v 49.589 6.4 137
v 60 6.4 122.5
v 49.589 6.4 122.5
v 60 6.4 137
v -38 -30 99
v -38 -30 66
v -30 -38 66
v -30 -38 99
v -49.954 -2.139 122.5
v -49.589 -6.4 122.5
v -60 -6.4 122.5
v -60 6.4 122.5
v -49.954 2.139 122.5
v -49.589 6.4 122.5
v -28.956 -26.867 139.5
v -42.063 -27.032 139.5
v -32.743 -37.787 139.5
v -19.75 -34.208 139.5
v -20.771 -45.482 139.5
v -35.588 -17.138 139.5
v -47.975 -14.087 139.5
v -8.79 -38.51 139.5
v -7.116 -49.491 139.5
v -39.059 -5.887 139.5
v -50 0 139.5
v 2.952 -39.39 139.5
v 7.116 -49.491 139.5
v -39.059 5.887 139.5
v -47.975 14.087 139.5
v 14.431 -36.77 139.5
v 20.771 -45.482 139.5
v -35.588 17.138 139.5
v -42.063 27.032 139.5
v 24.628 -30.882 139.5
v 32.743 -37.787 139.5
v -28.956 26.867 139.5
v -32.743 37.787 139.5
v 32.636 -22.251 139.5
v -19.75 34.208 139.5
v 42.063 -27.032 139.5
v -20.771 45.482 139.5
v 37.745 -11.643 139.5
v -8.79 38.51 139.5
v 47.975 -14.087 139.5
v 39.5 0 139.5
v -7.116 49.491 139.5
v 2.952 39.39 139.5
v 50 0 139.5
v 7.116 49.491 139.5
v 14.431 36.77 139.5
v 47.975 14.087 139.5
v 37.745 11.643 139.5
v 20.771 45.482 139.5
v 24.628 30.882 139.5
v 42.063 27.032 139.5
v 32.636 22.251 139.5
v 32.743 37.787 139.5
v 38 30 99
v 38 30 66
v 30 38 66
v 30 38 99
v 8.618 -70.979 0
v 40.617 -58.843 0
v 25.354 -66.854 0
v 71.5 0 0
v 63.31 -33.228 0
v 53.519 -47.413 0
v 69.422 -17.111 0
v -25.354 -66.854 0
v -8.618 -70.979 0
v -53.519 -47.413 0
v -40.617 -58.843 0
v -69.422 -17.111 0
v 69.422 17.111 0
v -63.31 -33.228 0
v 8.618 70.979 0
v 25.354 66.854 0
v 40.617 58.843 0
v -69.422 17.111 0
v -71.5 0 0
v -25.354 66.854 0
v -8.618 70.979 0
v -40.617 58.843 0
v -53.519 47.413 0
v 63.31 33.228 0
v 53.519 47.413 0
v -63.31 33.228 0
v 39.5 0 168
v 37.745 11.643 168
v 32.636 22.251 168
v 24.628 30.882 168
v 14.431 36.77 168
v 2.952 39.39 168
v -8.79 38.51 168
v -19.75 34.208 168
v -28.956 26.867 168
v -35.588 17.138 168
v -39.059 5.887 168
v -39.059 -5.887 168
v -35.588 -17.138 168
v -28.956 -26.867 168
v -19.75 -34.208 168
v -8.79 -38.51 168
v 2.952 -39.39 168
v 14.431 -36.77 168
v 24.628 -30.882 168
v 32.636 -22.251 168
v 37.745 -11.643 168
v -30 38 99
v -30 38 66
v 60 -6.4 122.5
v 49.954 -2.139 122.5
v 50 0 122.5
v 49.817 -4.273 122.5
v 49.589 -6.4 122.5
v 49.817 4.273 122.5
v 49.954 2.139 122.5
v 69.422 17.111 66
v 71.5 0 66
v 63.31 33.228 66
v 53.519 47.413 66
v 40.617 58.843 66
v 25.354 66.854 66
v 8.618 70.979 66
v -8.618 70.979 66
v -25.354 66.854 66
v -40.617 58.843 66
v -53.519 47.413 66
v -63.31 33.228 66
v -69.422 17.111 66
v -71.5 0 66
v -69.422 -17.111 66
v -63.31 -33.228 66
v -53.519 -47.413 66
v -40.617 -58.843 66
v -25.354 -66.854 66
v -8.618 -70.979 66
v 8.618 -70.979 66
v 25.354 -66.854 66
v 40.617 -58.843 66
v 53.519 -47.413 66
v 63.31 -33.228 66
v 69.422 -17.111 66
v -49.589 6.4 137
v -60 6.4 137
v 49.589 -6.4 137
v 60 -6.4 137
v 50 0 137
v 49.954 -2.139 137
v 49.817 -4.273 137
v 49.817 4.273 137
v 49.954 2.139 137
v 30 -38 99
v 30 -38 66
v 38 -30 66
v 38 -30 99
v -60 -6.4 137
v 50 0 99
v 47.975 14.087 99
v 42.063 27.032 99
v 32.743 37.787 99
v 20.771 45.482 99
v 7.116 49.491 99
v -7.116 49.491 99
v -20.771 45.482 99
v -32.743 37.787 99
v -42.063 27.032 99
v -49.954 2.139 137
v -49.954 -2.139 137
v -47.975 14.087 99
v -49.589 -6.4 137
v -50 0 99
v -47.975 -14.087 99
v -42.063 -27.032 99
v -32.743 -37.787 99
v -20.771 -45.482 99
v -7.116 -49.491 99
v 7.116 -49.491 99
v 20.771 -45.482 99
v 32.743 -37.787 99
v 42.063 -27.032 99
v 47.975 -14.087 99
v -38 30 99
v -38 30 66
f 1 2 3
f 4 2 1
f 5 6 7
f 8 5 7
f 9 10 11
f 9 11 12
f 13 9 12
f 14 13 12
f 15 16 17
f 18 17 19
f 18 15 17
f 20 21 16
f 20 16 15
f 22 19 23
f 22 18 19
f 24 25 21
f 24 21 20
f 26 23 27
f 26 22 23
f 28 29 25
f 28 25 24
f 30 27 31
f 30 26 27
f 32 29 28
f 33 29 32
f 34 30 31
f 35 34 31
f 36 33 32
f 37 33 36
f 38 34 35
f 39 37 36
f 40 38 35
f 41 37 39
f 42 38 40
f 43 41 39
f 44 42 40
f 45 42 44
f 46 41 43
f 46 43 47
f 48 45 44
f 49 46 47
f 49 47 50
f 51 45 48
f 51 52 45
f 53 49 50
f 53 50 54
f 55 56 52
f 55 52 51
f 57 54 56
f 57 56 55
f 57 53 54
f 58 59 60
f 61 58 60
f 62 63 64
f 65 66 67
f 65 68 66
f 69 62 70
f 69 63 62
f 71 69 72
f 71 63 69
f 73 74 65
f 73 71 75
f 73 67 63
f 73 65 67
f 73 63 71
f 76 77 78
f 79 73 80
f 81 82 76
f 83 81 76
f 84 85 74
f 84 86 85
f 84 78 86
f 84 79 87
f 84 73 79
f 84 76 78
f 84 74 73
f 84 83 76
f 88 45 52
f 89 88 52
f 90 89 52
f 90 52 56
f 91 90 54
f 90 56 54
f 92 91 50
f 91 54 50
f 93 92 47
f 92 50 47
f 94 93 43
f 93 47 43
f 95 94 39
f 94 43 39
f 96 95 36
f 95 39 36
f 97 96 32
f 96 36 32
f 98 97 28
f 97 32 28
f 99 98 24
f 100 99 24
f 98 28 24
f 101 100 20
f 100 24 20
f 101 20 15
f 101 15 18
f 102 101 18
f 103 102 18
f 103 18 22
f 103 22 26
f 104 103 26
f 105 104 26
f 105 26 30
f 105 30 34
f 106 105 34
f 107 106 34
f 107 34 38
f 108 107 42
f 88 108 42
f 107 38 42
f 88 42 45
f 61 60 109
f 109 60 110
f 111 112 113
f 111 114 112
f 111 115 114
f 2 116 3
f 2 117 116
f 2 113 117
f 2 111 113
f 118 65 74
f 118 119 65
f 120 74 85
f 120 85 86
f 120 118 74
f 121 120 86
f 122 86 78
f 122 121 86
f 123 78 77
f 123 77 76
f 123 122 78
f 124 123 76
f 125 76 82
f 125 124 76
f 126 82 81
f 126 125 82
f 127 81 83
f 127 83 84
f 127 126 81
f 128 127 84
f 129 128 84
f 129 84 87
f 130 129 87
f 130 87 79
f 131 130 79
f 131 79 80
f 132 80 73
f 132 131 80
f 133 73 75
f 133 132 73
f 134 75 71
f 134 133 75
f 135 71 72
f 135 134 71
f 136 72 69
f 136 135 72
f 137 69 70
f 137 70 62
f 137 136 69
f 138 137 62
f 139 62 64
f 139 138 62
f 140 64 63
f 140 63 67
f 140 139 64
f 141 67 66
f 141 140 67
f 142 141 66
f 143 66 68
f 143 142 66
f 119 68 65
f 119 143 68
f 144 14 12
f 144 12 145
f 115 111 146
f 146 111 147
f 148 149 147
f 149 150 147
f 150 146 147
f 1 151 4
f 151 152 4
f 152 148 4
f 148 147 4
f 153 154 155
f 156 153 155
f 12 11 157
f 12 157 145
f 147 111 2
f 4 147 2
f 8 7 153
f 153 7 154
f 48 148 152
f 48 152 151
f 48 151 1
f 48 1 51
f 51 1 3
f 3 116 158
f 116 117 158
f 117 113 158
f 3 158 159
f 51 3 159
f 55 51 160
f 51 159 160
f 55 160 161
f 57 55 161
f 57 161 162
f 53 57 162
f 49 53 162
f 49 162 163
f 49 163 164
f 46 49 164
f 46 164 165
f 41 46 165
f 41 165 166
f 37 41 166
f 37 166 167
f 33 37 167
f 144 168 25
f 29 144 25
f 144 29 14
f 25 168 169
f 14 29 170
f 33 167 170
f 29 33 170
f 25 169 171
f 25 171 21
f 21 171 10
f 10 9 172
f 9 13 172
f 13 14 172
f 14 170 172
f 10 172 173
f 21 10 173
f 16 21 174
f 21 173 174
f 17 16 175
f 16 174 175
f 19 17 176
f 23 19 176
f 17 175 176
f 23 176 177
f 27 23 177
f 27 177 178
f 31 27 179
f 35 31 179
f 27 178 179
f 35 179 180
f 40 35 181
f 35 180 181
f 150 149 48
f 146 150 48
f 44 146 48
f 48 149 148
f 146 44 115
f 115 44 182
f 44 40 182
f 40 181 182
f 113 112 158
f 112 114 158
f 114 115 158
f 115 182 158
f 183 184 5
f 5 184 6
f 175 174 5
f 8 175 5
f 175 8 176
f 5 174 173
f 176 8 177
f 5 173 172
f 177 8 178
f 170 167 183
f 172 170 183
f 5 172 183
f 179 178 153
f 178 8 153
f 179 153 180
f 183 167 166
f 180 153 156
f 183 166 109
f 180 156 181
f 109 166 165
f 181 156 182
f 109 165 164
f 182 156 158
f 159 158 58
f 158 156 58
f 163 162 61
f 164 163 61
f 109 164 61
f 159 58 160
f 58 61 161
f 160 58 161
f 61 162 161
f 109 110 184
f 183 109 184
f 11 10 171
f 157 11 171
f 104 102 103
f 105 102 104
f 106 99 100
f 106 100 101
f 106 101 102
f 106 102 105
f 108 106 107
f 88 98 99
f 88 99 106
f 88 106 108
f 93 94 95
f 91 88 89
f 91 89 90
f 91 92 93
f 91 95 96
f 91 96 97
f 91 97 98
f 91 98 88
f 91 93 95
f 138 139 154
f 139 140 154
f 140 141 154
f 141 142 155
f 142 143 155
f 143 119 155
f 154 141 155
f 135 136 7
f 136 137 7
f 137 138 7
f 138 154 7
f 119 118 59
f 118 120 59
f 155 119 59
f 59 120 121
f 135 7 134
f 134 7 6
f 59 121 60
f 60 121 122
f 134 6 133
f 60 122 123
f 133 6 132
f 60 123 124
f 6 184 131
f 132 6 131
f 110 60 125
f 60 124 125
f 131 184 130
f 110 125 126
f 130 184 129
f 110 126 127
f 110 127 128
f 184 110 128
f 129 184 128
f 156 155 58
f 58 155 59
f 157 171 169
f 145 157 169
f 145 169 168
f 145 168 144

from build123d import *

# Parameters (mm, degrees)
F0_W     = 71.5
F0_H     = 66
F3_DEPTH = 33
F4_R     = 50
F5_DEPTH = 40.5
F6_R     = 39.5
F7_DEPTH = 28.5
F8_W     = 12.8
F8_H     = 14.5
F9_DEPTH = 60


with BuildPart() as f1:
    # F0 (on Front) → F1 (revolve)
    with BuildSketch(Plane.XZ):
        with Locations((35.75, 33)):
            Rectangle(F0_W, F0_H)
    revolve(axis=Axis((0, 0, 33), (0, 0, 1)))

    # F2 (on face) → F3 (join)
    with BuildSketch(Plane.XY.offset(66)):
        Polygon((38, 30), (30, 38), (-30, 38), (-38, 30), (-38, -30), (-30, -38), (30, -38), (38, -30), align=None)
    extrude(amount=F3_DEPTH)

    # F4 (on face) → F5 (join)
    with BuildSketch(Plane.XY.offset(99)):
        Circle(F4_R)
        Polygon((30, 38), (38, 30), (38, -30), (30, -38), (-30, -38), (-38, -30), (-38, 30), (-30, 38), align=None, mode=Mode.SUBTRACT)
        Polygon((38, -30), (38, 30), (30, 38), (-30, 38), (-38, 30), (-38, -30), (-30, -38), (30, -38), align=None)
    extrude(amount=F5_DEPTH)

    # F6 (on face) → F7 (join)
    with BuildSketch(Plane.XY.offset(139.5)):
        Circle(F6_R)
    extrude(amount=F7_DEPTH)

    # F8 (on Right) → F9 (join, symmetric)
    with BuildSketch(Plane.YZ):
        with Locations((0, 129.75)):
            Rectangle(F8_W, F8_H)
    extrude(amount=F9_DEPTH, both=True)


solid = f1.part
